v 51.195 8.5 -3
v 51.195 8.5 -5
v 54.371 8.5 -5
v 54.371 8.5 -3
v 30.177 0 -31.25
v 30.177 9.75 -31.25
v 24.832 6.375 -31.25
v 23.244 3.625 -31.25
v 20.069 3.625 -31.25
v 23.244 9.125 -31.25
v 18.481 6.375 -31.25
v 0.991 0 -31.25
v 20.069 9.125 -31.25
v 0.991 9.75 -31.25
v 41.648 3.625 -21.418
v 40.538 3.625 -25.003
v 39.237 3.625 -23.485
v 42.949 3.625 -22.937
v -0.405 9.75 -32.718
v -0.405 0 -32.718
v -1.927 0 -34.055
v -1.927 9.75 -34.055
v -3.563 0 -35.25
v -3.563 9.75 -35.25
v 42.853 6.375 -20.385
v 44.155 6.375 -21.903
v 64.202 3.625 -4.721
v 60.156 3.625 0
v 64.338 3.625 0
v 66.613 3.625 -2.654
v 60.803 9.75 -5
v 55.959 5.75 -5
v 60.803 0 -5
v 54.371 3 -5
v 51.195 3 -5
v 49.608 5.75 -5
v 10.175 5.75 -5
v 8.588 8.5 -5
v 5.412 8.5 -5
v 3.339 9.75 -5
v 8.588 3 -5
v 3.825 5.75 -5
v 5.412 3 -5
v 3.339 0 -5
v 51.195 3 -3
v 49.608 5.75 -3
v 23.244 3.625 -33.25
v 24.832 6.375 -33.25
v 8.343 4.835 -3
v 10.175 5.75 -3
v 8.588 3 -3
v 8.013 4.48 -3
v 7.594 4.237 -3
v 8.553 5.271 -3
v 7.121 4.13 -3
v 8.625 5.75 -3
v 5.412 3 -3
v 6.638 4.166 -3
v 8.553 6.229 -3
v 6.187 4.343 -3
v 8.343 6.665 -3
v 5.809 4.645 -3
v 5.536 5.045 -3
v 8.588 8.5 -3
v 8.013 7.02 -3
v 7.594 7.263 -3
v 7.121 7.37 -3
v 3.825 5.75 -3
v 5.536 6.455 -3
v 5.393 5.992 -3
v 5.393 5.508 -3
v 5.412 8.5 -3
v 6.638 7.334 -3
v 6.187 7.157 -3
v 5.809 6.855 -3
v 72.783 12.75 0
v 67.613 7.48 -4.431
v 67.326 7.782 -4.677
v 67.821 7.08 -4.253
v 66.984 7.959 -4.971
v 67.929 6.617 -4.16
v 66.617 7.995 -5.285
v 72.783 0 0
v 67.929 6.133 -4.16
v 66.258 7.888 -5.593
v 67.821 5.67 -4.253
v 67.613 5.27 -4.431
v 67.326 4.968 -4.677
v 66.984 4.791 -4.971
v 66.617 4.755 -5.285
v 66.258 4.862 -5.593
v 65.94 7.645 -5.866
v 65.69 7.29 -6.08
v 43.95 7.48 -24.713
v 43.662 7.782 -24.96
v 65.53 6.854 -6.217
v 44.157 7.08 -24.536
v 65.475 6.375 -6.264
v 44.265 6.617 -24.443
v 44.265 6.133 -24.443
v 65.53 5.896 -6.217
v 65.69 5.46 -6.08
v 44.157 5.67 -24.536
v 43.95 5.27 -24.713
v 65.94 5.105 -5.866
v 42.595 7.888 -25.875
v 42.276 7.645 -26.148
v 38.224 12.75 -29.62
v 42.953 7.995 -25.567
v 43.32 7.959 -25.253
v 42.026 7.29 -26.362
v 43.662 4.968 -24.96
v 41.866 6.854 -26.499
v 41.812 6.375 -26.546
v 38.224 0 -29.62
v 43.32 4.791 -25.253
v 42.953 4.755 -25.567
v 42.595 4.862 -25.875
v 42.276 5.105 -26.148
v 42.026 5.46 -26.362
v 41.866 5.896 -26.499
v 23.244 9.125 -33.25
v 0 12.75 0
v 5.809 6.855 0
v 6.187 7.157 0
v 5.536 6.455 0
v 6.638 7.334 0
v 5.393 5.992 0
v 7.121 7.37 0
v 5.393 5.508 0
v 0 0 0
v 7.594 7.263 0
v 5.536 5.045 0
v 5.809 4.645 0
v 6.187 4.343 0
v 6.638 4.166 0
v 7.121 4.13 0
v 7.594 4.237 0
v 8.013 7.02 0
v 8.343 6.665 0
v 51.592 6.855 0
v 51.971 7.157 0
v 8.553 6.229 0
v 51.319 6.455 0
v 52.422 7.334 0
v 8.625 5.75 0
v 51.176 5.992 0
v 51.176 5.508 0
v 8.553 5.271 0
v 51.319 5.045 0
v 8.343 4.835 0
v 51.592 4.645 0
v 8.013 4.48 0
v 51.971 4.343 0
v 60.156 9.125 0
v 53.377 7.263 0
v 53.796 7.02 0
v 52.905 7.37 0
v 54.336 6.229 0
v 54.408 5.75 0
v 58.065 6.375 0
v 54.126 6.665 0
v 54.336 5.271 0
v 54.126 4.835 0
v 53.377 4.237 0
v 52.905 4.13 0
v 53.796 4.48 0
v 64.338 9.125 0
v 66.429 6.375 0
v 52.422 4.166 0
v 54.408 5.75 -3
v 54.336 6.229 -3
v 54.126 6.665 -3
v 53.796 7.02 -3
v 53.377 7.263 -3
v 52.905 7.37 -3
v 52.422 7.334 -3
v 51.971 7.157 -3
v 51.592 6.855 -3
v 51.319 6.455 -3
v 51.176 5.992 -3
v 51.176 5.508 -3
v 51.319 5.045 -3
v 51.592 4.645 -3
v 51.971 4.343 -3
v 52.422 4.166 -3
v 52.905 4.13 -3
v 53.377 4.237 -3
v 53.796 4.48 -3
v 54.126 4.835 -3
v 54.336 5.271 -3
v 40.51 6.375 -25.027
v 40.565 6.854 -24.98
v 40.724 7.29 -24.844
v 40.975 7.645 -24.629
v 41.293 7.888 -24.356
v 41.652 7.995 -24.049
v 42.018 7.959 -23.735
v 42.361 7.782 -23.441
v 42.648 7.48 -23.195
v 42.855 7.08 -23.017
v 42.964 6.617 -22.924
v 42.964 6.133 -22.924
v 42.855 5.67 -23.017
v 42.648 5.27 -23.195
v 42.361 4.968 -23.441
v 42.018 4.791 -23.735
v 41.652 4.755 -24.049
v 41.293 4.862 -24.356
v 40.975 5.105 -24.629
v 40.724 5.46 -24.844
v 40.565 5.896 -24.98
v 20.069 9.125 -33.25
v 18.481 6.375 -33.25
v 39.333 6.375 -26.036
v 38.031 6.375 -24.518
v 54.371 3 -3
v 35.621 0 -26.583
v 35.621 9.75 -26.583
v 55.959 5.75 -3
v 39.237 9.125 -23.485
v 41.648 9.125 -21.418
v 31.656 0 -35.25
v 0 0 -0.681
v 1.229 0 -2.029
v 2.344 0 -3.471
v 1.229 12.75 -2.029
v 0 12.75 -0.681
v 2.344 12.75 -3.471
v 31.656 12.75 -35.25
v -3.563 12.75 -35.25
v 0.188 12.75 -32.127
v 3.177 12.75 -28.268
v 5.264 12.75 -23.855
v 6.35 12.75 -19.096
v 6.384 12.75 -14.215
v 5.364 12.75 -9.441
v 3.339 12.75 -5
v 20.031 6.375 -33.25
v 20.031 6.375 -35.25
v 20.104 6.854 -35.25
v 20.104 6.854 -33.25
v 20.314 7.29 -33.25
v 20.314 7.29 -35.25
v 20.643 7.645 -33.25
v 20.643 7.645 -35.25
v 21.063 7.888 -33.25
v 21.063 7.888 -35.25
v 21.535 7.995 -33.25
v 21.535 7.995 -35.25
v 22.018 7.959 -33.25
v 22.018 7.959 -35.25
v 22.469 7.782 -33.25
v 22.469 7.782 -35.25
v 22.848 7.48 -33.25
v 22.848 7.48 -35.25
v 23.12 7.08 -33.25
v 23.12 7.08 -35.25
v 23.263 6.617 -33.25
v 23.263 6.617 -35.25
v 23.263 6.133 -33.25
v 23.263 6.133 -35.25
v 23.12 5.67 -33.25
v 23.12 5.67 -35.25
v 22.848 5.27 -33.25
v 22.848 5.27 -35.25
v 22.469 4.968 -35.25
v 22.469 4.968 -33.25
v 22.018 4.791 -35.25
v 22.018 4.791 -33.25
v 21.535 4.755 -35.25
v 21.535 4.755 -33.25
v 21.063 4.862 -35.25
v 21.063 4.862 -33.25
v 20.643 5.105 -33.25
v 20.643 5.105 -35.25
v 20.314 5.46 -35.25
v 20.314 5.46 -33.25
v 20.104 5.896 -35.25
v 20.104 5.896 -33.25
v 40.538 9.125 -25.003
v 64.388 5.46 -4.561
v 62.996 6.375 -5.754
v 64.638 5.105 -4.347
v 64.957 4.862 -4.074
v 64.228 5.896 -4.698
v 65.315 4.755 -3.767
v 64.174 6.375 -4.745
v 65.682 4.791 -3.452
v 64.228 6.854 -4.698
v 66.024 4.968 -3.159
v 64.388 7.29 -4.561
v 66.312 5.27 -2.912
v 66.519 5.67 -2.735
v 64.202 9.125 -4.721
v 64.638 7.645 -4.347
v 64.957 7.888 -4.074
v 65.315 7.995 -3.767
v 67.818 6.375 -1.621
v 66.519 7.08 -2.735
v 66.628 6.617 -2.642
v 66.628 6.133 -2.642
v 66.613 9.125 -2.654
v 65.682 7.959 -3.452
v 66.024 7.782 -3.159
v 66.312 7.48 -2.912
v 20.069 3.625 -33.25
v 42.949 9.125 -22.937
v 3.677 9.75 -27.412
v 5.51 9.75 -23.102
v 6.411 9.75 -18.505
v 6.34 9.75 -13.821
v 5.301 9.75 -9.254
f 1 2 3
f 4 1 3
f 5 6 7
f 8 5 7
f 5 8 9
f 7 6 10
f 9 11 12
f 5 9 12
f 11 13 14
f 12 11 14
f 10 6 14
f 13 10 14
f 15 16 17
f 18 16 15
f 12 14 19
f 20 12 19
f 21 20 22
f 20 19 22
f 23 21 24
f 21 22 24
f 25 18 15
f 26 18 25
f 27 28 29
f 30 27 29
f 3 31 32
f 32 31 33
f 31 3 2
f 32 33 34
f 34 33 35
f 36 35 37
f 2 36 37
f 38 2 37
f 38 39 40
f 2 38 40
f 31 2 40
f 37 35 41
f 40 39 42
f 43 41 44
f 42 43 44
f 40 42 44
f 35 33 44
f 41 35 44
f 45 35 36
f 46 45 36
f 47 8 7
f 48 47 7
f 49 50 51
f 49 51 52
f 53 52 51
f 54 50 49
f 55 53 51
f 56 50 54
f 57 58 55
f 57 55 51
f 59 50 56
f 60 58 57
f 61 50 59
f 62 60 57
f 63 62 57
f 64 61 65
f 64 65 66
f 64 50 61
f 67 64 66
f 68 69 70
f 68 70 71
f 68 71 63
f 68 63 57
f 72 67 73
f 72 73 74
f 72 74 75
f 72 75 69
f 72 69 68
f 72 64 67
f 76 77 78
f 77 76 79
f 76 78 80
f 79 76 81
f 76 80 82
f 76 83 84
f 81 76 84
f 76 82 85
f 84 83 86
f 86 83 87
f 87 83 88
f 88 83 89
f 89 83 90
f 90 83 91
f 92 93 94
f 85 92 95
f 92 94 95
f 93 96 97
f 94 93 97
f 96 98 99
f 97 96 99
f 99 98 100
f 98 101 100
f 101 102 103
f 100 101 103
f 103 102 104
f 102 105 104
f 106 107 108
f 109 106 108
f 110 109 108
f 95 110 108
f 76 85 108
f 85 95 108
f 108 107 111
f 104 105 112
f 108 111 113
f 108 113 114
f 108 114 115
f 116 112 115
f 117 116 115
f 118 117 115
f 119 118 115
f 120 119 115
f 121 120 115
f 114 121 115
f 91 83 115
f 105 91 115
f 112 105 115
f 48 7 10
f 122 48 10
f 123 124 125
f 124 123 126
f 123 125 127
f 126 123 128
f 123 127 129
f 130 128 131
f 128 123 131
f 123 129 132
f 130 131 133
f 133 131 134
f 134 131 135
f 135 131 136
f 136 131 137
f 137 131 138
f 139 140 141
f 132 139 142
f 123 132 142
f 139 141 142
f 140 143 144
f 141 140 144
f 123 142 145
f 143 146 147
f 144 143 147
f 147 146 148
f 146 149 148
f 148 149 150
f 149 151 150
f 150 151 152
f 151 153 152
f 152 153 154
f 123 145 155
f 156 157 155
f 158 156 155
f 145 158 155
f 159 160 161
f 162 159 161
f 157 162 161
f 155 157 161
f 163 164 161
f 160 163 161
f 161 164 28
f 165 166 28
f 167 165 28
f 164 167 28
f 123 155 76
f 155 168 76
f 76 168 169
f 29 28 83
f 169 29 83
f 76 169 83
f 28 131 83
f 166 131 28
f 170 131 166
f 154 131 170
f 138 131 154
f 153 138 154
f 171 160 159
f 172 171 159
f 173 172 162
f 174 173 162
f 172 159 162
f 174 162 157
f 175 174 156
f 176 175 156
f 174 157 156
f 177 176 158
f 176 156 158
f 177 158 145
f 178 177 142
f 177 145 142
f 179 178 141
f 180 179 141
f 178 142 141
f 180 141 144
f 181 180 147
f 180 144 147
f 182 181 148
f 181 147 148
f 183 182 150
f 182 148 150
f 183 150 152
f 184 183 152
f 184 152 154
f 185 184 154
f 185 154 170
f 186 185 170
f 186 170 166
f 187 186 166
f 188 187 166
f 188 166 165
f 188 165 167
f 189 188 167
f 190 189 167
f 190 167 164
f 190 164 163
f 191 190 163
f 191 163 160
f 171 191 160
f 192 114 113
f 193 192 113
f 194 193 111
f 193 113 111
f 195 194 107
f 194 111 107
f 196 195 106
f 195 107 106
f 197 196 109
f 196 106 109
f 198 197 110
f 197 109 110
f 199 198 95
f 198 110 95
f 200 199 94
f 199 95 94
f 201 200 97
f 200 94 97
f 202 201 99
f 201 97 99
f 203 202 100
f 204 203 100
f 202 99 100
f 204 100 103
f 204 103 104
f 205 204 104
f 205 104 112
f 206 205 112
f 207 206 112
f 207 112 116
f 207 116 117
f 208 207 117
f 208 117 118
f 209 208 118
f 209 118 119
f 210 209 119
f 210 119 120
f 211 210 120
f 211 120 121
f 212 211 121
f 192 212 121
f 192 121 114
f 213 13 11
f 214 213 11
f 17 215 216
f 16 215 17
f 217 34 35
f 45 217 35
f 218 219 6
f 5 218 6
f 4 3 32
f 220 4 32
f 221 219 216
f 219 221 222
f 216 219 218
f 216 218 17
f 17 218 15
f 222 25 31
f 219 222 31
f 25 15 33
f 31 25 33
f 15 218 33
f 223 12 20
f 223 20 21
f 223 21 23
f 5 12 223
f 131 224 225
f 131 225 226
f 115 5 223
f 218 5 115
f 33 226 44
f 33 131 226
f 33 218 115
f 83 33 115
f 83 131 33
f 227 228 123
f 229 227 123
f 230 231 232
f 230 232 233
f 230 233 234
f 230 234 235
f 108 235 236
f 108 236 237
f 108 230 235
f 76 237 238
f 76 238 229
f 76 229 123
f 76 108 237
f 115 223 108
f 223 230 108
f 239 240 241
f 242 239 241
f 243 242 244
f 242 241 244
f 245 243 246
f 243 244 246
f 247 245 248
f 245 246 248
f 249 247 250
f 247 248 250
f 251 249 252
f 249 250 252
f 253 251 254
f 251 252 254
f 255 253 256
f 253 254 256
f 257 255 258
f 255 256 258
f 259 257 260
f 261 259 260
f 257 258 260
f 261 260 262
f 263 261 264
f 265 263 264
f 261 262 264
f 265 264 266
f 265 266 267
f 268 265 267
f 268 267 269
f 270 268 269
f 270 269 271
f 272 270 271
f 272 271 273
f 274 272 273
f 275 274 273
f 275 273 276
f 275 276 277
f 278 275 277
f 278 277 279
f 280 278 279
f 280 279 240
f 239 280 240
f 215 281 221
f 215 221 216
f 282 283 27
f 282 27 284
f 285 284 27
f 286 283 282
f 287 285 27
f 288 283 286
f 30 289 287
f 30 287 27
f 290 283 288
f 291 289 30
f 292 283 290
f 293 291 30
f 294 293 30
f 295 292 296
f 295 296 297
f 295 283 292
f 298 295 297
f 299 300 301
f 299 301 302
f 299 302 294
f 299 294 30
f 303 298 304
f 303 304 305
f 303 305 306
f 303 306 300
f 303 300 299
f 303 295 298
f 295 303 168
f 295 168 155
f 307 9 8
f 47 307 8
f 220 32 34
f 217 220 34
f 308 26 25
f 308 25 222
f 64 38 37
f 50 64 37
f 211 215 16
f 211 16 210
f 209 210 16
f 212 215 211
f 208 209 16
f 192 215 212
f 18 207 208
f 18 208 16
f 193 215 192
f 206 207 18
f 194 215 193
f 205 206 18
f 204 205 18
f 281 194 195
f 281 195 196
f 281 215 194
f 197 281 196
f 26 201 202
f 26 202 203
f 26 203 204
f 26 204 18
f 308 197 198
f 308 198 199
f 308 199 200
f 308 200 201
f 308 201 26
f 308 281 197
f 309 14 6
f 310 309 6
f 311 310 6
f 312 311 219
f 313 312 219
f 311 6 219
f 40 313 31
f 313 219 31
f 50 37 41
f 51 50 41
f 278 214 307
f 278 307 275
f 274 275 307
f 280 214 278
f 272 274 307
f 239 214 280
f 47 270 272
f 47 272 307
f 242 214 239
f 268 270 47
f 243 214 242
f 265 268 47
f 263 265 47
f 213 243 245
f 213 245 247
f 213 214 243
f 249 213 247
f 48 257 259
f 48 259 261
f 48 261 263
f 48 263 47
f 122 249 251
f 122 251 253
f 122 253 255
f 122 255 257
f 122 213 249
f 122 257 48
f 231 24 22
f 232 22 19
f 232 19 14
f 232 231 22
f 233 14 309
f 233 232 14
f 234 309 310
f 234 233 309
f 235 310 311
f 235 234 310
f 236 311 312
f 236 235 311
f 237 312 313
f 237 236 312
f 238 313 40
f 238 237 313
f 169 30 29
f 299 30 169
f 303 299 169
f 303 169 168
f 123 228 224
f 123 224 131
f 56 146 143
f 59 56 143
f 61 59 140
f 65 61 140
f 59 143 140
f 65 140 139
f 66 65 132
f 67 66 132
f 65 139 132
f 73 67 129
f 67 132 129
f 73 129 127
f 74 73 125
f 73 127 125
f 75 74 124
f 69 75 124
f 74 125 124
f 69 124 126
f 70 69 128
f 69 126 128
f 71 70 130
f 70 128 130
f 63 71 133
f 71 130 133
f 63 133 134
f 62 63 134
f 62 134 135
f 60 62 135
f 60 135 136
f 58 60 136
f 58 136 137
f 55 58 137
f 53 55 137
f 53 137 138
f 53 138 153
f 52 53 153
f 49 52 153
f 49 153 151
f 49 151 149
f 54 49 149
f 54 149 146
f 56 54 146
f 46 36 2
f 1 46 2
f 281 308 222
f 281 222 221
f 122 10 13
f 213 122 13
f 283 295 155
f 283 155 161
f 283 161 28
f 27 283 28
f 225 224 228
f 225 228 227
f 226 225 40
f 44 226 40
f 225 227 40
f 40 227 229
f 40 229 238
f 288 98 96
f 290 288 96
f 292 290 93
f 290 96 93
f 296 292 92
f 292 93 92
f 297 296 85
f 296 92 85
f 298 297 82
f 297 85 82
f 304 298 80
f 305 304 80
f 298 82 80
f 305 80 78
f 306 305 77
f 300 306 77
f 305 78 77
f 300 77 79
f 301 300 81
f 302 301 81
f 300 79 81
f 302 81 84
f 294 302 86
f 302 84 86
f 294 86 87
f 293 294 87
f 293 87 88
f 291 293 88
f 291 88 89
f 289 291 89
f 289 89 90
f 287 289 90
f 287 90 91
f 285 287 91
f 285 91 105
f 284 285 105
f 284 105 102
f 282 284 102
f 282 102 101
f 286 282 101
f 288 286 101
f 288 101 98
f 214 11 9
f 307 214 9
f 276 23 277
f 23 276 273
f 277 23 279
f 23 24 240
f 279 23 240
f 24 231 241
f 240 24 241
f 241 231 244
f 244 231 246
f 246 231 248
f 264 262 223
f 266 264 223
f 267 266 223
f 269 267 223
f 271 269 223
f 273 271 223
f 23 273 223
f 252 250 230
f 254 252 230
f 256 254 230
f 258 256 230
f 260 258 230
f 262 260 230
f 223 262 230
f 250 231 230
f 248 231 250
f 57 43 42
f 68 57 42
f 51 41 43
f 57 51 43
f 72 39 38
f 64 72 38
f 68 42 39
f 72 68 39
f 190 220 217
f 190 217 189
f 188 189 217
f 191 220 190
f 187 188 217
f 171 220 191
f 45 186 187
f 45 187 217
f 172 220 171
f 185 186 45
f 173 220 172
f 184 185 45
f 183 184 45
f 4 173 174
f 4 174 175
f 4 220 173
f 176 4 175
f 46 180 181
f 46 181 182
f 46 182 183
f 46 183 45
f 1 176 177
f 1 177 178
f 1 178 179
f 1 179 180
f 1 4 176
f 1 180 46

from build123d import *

# Parameters (mm, degrees)
SALIENTE_EXTRUIR1_DEPTH = 12.75
CORTAR_EXTRUIR1_REACH   = 31.62
CROQUIS2_R              = 1.625
CROQUIS3_R              = 22.5
CORTAR_EXTRUIR2_DEPTH   = 13.75
SALIENTE_EXTRUIR2_DEPTH = 3
SALIENTE_EXTRUIR3_DEPTH = 9.75
CROQUIS6_R              = 1.625
CORTAR_EXTRUIR3_DEPTH   = 10
CORTAR_EXTRUIR4_START   = -2
CORTAR_EXTRUIR4_DEPTH   = 10
CORTAR_EXTRUIR5_START   = -2
CORTAR_EXTRUIR5_DEPTH   = 10
CORTAR_EXTRUIR6_DEPTH   = 2
CORTAR_EXTRUIR7_REACH   = 37.25
CROQUIS10_R             = 1.625
CORTAR_EXTRUIR8_DEPTH   = 2


with BuildPart() as part:
    # Croquis1 → Saliente-Extruir1 (new body)
    with BuildSketch(Plane(origin=(0, 0, 0), x_dir=(1, 0, 0), z_dir=(0, 1, 0))):
        Polygon((0, 0), (72.78319995, 0), (38.224450787, 29.62043043), (35.621353918, 26.5833452), (60.803074847, 5), (0, 5), align=None)
    extrude(amount=SALIENTE_EXTRUIR1_DEPTH)

    # Croquis2 → Cortar-Extruir1 (cut, up to next)
    with BuildSketch(Plane.XY, mode=Mode.PRIVATE) as cortar_extruir1_sk1:
        with Locations((52.78319995, 5.75)):
            Circle(CROQUIS2_R)
    cortar_extruir1_tool1 = extrude(cortar_extruir1_sk1.sketch, amount=-CORTAR_EXTRUIR1_REACH, mode=Mode.PRIVATE) & part.part
    add(cortar_extruir1_tool1.solids().sort_by_distance((52.7832, 5.75, 0))[0], mode=Mode.SUBTRACT)
    # Croquis2 → Cortar-Extruir1 (cut, up to next)
    with BuildSketch(Plane.XY, mode=Mode.PRIVATE) as cortar_extruir1_sk2:
        with Locations((6.99999995, 5.75)):
            Circle(CROQUIS2_R)
    cortar_extruir1_tool2 = extrude(cortar_extruir1_sk2.sketch, amount=-CORTAR_EXTRUIR1_REACH, mode=Mode.PRIVATE) & part.part
    add(cortar_extruir1_tool2.solids().sort_by_distance((7, 5.75, 0))[0], mode=Mode.SUBTRACT)

    # Croquis3 → Cortar-Extruir2 (cut, through all)
    with BuildSketch(Plane(origin=(0, 12.75, 0), x_dir=(1, 0, 0), z_dir=(0, 1, 0))):
        with Locations((-16, 16.5)):
            Circle(CROQUIS3_R)
    extrude(amount=-CORTAR_EXTRUIR2_DEPTH, mode=Mode.SUBTRACT)

    # Croquis4 → Saliente-Extruir2 (add)
    with BuildSketch(Plane(origin=(0, 12.75, 0), x_dir=(1, 0, 0), z_dir=(0, 1, 0))):
        with BuildLine():
            Line((38.224450787, 29.62043043), (31.656319269, 35.25))
            Line((31.656319269, 35.25), (-3.562657036, 35.25))
            ThreePointArc((-3.562657036, 35.25), (5.936291456, 21.504909307), (3.339079606, 5))
            Line((3.339079606, 5), (60.803074847, 5))
            Line((60.803074847, 5), (35.621353918, 26.5833452))
            Line((35.621353918, 26.5833452), (38.224450787, 29.62043043))
        make_face()
    extrude(amount=-SALIENTE_EXTRUIR2_DEPTH)

    # Croquis5 → Saliente-Extruir3 (add)
    with BuildSketch(Plane.XZ.offset(-9.75)):
        with BuildLine():
            Line((-3.562657036, -35.25), (31.656319269, -35.25))
            Line((31.656319269, -35.25), (38.224450787, -29.62043043))
            Line((38.224450787, -29.62043043), (35.621353918, -26.5833452))
            Line((35.621353918, -26.5833452), (30.17667434, -31.25))
            Line((30.17667434, -31.25), (0.990806338, -31.25))
            ThreePointArc((0.990806338, -31.25), (-1.15062315, -33.404023402), (-3.562657036, -35.25))
        make_face()
    extrude(amount=SALIENTE_EXTRUIR3_DEPTH)

    # Croquis6 → Cortar-Extruir3 (cut)
    with BuildSketch(Plane(origin=(30.824200619, 0, -35.963211942), x_dir=(-0.759271307, 0, -0.650774217), z_dir=(0.650774217, 0, -0.759271307))):
        with Locations((-47.262195378, 6.375)):
            Circle(CROQUIS6_R)
        with Locations((-16.095943758, 6.375)):
            Circle(CROQUIS6_R)
    extrude(amount=-CORTAR_EXTRUIR3_DEPTH, mode=Mode.SUBTRACT)

    # Croquis7 → Cortar-Extruir4 (cut)
    with BuildSketch(Plane(origin=(28.22110375, 0, -32.926126712), x_dir=(0.759271307, 0, 0.650774217), z_dir=(-0.650774217, 0, 0.759271307)).offset(CORTAR_EXTRUIR4_START)):
        Polygon((48.849908618, 3.625), (50.437621859, 6.375), (48.849908618, 9.125), (45.674482138, 9.125), (44.086768898, 6.375), (45.674482138, 3.625), align=None)
    extrude(amount=CORTAR_EXTRUIR4_DEPTH, mode=Mode.SUBTRACT)

    # Croquis8 → Cortar-Extruir5 (cut)
    with BuildSketch(Plane(origin=(28.22110375, 0, -32.926126712), x_dir=(0.759271307, 0, 0.650774217), z_dir=(-0.650774217, 0, 0.759271307)).offset(CORTAR_EXTRUIR5_START)):
        Polygon((17.683656999, 3.625), (19.271370239, 6.375), (17.683656999, 9.125), (14.508230518, 9.125), (12.920517278, 6.375), (14.508230518, 3.625), align=None)
    extrude(amount=CORTAR_EXTRUIR5_DEPTH, mode=Mode.SUBTRACT)

    # Croquis9 → Cortar-Extruir6 (cut)
    with BuildSketch(Plane(origin=(0, 0, -5), x_dir=(-1, 0, 0), z_dir=(0, 0, -1))):
        Polygon((-5.41228671, 3), (-3.824573469, 5.75), (-5.41228671, 8.5), (-8.58771319, 8.5), (-10.175426431, 5.75), (-8.58771319, 3), align=None)
        Polygon((-51.19548671, 3), (-49.607773469, 5.75), (-51.19548671, 8.5), (-54.37091319, 8.5), (-55.958626431, 5.75), (-54.37091319, 3), align=None)
    extrude(amount=-CORTAR_EXTRUIR6_DEPTH, mode=Mode.SUBTRACT)

    # Croquis10 → Cortar-Extruir7 (cut, up to next)
    with BuildSketch(Plane(origin=(0, 0, -35.25), x_dir=(-1, 0, 0), z_dir=(0, 0, -1)), mode=Mode.PRIVATE) as cortar_extruir7_sk1:
        with Locations((-21.656319269, 6.375)):
            Circle(CROQUIS10_R)
    cortar_extruir7_tool1 = extrude(cortar_extruir7_sk1.sketch, amount=-CORTAR_EXTRUIR7_REACH, mode=Mode.PRIVATE) & part.part
    add(cortar_extruir7_tool1.solids().sort_by_distance((21.656319, 6.375, -35.25))[0], mode=Mode.SUBTRACT)

    # Croquis11 → Cortar-Extruir8 (cut)
    with BuildSketch(Plane.XY.offset(-31.25)):
        Polygon((23.24403251, 3.625), (24.83174575, 6.375), (23.24403251, 9.125), (20.068606029, 9.125), (18.480892789, 6.375), (20.068606029, 3.625), align=None)
    extrude(amount=-CORTAR_EXTRUIR8_DEPTH, mode=Mode.SUBTRACT)


solid = part.part
